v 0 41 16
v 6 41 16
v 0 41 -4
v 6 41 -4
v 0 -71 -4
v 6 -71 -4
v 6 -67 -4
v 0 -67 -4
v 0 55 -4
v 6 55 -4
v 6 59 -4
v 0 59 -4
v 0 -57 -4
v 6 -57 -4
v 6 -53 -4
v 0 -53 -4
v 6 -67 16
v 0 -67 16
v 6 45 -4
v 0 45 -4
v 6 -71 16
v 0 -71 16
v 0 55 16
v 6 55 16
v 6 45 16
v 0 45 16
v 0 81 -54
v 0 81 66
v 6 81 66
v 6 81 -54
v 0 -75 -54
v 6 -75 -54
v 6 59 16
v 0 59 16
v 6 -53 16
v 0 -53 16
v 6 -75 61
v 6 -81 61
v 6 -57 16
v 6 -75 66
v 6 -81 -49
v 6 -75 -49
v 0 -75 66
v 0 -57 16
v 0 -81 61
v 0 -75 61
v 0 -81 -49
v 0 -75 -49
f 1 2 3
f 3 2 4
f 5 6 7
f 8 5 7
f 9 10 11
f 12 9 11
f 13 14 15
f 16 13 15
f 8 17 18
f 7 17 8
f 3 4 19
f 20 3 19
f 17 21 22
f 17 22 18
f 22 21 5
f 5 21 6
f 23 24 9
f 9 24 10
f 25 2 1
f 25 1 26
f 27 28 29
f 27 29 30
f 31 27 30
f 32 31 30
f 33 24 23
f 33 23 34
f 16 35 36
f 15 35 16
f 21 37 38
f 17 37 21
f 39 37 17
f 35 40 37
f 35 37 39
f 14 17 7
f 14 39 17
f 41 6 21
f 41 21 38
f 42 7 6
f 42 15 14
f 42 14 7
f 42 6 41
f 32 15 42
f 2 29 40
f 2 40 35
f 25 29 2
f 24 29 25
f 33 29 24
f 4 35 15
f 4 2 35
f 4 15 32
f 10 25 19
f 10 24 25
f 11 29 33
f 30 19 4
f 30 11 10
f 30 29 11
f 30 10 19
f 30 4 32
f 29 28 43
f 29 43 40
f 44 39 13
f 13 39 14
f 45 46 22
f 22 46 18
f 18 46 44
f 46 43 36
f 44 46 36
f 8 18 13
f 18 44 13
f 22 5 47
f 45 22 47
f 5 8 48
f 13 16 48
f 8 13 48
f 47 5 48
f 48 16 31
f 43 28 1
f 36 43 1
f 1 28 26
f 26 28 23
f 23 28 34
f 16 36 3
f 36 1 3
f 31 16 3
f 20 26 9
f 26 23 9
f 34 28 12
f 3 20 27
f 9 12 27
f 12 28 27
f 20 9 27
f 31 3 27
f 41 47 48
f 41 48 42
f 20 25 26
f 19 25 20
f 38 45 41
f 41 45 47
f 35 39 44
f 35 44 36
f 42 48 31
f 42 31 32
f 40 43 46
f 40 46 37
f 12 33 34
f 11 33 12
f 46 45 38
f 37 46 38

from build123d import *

# Parameters (mm, degrees)
CROQUIS2_W              = 135
CROQUIS2_H              = 162
SALIENTE_EXTRUIR1_DEPTH = 6
CROQUIS4_W              = 6
CROQUIS4_H              = 13.5
CROQUIS4_H_2            = 1.5
CORTAR_EXTRUIR2_DEPTH   = 163
CROQUIS5_W              = 6
CROQUIS5_H              = 6.5
CROQUIS5_H_2            = 5
CORTAR_EXTRUIR3_DEPTH   = 6
CROQUIS7_W              = 20
CROQUIS7_H              = 4
CORTAR_EXTRUIR5_DEPTH   = 6


with BuildPart() as part:
    # Croquis2 → Saliente-Extruir1 (new body)
    with BuildSketch(Plane(origin=(0, 0, 0), x_dir=(0, 0, -1), z_dir=(1, 0, 0))):
        Rectangle(CROQUIS2_W, CROQUIS2_H)
    extrude(amount=SALIENTE_EXTRUIR1_DEPTH)

    # Croquis4 → Cortar-Extruir2 (cut, through all)
    with BuildSketch(Plane(origin=(0, 81, 0), x_dir=(1, 0, 0), z_dir=(0, 1, 0))):
        with Locations((3, 60.75)):
            Rectangle(CROQUIS4_W, CROQUIS4_H)
        with Locations((3, -66.75)):
            Rectangle(CROQUIS4_W, CROQUIS4_H_2)
    extrude(amount=-CORTAR_EXTRUIR2_DEPTH, mode=Mode.SUBTRACT)

    # Croquis5 → Cortar-Extruir3 (cut)
    with BuildSketch(Plane.XZ.offset(81)):
        with Locations((3, 64.25)):
            Rectangle(CROQUIS5_W, CROQUIS5_H)
        with Locations((3, -51.5)):
            Rectangle(CROQUIS5_W, CROQUIS5_H_2)
    extrude(amount=-CORTAR_EXTRUIR3_DEPTH, mode=Mode.SUBTRACT)

    # Croquis7 → Cortar-Extruir5 (cut)
    with BuildSketch(Plane(origin=(6, 0, 0), x_dir=(0, 0, -1), z_dir=(1, 0, 0))):
        with Locations((-6, -69)):
            Rectangle(CROQUIS7_W, CROQUIS7_H)
        with Locations((-6, -55)):
            Rectangle(CROQUIS7_W, CROQUIS7_H)
        with Locations((-6, 43)):
            Rectangle(CROQUIS7_W, CROQUIS7_H)
        with Locations((-6, 57)):
            Rectangle(CROQUIS7_W, CROQUIS7_H)
    extrude(amount=-CORTAR_EXTRUIR5_DEPTH, mode=Mode.SUBTRACT)


solid = part.part
